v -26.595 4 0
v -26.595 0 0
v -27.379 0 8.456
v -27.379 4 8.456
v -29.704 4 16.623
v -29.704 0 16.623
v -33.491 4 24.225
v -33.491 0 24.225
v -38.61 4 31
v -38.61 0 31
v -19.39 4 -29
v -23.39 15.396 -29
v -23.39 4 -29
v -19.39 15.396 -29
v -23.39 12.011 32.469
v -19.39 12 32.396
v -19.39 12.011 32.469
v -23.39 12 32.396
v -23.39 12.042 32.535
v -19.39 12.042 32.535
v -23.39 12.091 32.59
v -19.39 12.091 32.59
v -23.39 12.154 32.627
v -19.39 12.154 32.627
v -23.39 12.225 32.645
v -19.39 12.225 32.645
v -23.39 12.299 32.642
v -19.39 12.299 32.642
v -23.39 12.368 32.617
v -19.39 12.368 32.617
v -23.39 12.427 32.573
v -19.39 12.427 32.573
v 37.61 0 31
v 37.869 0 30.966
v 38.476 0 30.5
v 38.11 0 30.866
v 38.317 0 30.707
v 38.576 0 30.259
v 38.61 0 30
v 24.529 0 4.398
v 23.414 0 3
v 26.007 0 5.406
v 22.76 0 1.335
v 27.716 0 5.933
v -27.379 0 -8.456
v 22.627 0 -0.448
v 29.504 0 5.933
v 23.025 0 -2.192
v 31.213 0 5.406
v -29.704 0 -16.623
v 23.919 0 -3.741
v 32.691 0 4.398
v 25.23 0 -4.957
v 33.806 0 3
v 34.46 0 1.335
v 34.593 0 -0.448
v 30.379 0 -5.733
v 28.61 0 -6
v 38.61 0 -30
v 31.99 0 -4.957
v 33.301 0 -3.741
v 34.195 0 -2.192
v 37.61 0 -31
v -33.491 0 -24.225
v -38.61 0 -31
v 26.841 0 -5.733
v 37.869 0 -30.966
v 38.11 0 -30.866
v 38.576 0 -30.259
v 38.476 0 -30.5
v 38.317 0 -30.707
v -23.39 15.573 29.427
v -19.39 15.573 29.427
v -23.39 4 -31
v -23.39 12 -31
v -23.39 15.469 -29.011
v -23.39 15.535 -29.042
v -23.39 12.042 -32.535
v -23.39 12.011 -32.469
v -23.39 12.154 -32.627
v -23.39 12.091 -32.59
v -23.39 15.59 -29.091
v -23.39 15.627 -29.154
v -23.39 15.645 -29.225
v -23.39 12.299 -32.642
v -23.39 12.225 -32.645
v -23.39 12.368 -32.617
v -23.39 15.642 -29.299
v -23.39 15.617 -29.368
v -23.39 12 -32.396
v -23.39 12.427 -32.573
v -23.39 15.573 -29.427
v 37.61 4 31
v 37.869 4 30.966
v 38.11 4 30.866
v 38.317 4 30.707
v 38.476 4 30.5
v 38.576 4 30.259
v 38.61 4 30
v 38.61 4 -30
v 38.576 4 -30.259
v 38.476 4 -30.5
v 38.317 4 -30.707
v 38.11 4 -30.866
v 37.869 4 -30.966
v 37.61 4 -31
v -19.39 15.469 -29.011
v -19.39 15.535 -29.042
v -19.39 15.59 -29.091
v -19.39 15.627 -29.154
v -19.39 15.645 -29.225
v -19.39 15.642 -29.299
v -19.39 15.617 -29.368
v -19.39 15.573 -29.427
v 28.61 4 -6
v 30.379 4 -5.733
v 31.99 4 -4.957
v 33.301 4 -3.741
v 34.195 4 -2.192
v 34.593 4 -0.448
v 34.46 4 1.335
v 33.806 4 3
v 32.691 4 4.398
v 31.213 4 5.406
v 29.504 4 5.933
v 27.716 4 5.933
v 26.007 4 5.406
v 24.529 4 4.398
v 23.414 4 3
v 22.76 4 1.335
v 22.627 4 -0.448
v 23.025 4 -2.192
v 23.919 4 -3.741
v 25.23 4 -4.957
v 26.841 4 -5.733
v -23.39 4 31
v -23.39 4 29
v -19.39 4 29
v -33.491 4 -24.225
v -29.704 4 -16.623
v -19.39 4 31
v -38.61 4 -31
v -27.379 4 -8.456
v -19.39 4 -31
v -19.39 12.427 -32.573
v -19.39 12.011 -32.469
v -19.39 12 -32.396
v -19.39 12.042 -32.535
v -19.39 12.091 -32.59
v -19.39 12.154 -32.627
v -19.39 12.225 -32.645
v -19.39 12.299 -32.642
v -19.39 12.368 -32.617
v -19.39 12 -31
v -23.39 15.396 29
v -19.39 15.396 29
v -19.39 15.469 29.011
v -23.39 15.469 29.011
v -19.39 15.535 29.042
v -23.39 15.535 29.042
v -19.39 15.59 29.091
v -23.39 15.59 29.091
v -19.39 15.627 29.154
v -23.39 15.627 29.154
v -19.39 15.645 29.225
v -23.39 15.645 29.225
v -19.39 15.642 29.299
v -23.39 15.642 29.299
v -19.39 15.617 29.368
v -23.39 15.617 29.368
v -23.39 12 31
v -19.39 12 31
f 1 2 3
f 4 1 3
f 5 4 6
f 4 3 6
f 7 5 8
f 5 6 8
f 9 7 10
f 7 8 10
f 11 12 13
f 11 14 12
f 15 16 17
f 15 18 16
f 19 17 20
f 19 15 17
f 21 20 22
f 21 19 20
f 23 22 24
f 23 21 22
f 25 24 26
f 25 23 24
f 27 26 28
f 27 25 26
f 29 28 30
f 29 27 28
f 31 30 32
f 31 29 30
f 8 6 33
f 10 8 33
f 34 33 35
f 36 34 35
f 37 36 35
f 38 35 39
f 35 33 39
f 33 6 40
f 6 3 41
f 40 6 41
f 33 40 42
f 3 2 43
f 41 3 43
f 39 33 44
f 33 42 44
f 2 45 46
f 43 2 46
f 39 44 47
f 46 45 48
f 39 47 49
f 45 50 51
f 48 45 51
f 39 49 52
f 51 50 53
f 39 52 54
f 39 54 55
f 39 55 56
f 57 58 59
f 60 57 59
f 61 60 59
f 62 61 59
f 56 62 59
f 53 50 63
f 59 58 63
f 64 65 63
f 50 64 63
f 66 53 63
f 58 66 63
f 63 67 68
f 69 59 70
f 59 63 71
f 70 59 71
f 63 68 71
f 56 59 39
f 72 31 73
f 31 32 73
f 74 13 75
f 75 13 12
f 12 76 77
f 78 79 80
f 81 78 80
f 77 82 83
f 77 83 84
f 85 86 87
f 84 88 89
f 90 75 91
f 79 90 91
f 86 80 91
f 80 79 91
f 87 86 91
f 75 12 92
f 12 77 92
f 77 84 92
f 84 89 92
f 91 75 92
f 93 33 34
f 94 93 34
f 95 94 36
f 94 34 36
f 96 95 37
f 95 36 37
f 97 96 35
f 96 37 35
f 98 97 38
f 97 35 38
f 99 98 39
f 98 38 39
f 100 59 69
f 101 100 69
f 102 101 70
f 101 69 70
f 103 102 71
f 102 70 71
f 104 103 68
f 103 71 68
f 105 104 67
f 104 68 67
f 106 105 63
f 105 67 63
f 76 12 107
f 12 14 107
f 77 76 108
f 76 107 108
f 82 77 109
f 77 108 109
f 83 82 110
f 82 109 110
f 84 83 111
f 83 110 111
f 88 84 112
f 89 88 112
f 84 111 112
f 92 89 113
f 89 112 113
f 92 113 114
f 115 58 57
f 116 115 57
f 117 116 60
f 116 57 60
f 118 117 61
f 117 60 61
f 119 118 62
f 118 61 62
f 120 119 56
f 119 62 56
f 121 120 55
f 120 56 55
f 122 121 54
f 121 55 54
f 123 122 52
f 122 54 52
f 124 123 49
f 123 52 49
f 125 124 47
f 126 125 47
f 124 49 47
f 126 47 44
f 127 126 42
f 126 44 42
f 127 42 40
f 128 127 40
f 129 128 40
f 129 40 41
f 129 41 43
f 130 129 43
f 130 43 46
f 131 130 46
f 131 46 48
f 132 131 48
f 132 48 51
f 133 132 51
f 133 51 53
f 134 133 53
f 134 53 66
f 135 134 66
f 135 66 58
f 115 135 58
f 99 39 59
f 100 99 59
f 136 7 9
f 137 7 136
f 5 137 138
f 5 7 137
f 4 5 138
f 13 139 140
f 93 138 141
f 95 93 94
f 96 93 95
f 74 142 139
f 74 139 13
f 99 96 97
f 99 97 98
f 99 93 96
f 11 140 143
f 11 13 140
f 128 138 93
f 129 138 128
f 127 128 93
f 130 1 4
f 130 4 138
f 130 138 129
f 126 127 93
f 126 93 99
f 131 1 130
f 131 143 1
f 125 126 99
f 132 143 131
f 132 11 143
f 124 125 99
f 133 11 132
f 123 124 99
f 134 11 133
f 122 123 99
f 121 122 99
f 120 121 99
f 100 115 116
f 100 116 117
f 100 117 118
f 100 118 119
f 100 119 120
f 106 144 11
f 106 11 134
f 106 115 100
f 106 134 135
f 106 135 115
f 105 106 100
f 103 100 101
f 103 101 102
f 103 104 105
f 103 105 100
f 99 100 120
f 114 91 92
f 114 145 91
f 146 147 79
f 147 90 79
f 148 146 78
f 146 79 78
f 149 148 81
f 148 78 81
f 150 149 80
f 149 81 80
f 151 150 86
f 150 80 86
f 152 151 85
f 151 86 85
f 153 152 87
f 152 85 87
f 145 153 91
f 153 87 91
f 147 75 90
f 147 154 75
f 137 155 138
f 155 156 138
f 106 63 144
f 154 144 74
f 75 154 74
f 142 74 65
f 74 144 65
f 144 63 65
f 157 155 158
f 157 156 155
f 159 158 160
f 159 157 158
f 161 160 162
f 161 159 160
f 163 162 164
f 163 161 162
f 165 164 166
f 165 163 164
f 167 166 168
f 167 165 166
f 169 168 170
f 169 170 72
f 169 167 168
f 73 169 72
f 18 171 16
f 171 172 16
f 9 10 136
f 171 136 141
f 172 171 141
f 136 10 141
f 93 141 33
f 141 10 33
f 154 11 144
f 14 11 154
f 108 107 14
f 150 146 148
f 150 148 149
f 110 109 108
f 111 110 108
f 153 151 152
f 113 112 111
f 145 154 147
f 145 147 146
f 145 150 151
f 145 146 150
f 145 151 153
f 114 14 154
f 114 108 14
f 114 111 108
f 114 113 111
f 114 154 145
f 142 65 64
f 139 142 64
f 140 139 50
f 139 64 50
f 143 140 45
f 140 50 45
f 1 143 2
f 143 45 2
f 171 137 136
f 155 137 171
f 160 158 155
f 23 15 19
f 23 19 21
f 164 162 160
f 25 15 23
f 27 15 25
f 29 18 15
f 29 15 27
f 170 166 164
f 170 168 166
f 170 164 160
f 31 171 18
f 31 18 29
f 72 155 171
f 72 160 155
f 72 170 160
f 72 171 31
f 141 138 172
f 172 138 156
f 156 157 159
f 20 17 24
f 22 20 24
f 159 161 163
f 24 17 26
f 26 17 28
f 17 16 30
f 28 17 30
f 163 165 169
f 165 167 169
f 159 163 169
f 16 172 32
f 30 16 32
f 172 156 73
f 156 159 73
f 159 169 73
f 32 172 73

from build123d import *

# Parameters (mm, degrees)
EXTRUDE_1_DEPTH        = 4
EXTRUDE_1010_DEPTH     = 2
FILLET_1_R             = 0.25
FILLET_1_OF_MIRROR_1_R = 0.25
SKETCH_4_R             = 6
CUT_EXTRUDE_2_DEPTH    = 53.927628586


with BuildPart() as part:
    # 草图1 → 凸台-拉伸1 (new body)
    with BuildSketch(Plane(origin=(0, 0, 0), x_dir=(1, 0, 0), z_dir=(0, 1, 0))):
        with BuildLine():
            ThreePointArc((38.61, 30), (38.317106781, 30.707106781), (37.61, 31))
            Line((37.61, 31), (-38.61, 31))
            ThreePointArc((-38.61, 31), (-26.595290936, 0), (-38.61, -31))
            Line((-38.61, -31), (37.61, -31))
            ThreePointArc((37.61, -31), (38.317106781, -30.707106781), (38.61, -30))
            Line((38.61, -30), (38.61, 30))
        make_face()
    extrude(amount=EXTRUDE_1_DEPTH)

    # 草图3 → Extrude 1010 (add, symmetric)
    with BuildSketch(Plane(origin=(-21.39, 0, 0), x_dir=(0, 0, -1), z_dir=(1, 0, 0))):
        Polygon((-31, 4), (-31, 12), (-33, 12), (-29, 16), (-29, 4), align=None)
    extrude_1010 = extrude(amount=EXTRUDE_1010_DEPTH, both=True)

    # 圆角1
    fillet_1_edges = [part.edges().sort_by_distance(p)[0] for p in [
        (-21.39, 16, 29),
        (-21.39, 12, 33),
    ]]
    fillet(fillet_1_edges, radius=FILLET_1_R)

    # 镜向1: Extrude 1010 across plane
    add(extrude_1010.mirror(Plane.XY))

    # 圆角1 of 镜向1
    fillet_1_of_mirror_1_edges = [part.edges().sort_by_distance(p)[0] for p in [
        (-21.39, 16, -29),
        (-21.39, 12, -33),
    ]]
    fillet(fillet_1_of_mirror_1_edges, radius=FILLET_1_OF_MIRROR_1_R)

    # 草图4 → 切除-拉伸2 (cut, through all)
    with BuildSketch(Plane.XZ):
        with Locations((28.61, 0)):
            Circle(SKETCH_4_R)
    extrude(amount=-CUT_EXTRUDE_2_DEPTH, mode=Mode.SUBTRACT)


solid = part.part
